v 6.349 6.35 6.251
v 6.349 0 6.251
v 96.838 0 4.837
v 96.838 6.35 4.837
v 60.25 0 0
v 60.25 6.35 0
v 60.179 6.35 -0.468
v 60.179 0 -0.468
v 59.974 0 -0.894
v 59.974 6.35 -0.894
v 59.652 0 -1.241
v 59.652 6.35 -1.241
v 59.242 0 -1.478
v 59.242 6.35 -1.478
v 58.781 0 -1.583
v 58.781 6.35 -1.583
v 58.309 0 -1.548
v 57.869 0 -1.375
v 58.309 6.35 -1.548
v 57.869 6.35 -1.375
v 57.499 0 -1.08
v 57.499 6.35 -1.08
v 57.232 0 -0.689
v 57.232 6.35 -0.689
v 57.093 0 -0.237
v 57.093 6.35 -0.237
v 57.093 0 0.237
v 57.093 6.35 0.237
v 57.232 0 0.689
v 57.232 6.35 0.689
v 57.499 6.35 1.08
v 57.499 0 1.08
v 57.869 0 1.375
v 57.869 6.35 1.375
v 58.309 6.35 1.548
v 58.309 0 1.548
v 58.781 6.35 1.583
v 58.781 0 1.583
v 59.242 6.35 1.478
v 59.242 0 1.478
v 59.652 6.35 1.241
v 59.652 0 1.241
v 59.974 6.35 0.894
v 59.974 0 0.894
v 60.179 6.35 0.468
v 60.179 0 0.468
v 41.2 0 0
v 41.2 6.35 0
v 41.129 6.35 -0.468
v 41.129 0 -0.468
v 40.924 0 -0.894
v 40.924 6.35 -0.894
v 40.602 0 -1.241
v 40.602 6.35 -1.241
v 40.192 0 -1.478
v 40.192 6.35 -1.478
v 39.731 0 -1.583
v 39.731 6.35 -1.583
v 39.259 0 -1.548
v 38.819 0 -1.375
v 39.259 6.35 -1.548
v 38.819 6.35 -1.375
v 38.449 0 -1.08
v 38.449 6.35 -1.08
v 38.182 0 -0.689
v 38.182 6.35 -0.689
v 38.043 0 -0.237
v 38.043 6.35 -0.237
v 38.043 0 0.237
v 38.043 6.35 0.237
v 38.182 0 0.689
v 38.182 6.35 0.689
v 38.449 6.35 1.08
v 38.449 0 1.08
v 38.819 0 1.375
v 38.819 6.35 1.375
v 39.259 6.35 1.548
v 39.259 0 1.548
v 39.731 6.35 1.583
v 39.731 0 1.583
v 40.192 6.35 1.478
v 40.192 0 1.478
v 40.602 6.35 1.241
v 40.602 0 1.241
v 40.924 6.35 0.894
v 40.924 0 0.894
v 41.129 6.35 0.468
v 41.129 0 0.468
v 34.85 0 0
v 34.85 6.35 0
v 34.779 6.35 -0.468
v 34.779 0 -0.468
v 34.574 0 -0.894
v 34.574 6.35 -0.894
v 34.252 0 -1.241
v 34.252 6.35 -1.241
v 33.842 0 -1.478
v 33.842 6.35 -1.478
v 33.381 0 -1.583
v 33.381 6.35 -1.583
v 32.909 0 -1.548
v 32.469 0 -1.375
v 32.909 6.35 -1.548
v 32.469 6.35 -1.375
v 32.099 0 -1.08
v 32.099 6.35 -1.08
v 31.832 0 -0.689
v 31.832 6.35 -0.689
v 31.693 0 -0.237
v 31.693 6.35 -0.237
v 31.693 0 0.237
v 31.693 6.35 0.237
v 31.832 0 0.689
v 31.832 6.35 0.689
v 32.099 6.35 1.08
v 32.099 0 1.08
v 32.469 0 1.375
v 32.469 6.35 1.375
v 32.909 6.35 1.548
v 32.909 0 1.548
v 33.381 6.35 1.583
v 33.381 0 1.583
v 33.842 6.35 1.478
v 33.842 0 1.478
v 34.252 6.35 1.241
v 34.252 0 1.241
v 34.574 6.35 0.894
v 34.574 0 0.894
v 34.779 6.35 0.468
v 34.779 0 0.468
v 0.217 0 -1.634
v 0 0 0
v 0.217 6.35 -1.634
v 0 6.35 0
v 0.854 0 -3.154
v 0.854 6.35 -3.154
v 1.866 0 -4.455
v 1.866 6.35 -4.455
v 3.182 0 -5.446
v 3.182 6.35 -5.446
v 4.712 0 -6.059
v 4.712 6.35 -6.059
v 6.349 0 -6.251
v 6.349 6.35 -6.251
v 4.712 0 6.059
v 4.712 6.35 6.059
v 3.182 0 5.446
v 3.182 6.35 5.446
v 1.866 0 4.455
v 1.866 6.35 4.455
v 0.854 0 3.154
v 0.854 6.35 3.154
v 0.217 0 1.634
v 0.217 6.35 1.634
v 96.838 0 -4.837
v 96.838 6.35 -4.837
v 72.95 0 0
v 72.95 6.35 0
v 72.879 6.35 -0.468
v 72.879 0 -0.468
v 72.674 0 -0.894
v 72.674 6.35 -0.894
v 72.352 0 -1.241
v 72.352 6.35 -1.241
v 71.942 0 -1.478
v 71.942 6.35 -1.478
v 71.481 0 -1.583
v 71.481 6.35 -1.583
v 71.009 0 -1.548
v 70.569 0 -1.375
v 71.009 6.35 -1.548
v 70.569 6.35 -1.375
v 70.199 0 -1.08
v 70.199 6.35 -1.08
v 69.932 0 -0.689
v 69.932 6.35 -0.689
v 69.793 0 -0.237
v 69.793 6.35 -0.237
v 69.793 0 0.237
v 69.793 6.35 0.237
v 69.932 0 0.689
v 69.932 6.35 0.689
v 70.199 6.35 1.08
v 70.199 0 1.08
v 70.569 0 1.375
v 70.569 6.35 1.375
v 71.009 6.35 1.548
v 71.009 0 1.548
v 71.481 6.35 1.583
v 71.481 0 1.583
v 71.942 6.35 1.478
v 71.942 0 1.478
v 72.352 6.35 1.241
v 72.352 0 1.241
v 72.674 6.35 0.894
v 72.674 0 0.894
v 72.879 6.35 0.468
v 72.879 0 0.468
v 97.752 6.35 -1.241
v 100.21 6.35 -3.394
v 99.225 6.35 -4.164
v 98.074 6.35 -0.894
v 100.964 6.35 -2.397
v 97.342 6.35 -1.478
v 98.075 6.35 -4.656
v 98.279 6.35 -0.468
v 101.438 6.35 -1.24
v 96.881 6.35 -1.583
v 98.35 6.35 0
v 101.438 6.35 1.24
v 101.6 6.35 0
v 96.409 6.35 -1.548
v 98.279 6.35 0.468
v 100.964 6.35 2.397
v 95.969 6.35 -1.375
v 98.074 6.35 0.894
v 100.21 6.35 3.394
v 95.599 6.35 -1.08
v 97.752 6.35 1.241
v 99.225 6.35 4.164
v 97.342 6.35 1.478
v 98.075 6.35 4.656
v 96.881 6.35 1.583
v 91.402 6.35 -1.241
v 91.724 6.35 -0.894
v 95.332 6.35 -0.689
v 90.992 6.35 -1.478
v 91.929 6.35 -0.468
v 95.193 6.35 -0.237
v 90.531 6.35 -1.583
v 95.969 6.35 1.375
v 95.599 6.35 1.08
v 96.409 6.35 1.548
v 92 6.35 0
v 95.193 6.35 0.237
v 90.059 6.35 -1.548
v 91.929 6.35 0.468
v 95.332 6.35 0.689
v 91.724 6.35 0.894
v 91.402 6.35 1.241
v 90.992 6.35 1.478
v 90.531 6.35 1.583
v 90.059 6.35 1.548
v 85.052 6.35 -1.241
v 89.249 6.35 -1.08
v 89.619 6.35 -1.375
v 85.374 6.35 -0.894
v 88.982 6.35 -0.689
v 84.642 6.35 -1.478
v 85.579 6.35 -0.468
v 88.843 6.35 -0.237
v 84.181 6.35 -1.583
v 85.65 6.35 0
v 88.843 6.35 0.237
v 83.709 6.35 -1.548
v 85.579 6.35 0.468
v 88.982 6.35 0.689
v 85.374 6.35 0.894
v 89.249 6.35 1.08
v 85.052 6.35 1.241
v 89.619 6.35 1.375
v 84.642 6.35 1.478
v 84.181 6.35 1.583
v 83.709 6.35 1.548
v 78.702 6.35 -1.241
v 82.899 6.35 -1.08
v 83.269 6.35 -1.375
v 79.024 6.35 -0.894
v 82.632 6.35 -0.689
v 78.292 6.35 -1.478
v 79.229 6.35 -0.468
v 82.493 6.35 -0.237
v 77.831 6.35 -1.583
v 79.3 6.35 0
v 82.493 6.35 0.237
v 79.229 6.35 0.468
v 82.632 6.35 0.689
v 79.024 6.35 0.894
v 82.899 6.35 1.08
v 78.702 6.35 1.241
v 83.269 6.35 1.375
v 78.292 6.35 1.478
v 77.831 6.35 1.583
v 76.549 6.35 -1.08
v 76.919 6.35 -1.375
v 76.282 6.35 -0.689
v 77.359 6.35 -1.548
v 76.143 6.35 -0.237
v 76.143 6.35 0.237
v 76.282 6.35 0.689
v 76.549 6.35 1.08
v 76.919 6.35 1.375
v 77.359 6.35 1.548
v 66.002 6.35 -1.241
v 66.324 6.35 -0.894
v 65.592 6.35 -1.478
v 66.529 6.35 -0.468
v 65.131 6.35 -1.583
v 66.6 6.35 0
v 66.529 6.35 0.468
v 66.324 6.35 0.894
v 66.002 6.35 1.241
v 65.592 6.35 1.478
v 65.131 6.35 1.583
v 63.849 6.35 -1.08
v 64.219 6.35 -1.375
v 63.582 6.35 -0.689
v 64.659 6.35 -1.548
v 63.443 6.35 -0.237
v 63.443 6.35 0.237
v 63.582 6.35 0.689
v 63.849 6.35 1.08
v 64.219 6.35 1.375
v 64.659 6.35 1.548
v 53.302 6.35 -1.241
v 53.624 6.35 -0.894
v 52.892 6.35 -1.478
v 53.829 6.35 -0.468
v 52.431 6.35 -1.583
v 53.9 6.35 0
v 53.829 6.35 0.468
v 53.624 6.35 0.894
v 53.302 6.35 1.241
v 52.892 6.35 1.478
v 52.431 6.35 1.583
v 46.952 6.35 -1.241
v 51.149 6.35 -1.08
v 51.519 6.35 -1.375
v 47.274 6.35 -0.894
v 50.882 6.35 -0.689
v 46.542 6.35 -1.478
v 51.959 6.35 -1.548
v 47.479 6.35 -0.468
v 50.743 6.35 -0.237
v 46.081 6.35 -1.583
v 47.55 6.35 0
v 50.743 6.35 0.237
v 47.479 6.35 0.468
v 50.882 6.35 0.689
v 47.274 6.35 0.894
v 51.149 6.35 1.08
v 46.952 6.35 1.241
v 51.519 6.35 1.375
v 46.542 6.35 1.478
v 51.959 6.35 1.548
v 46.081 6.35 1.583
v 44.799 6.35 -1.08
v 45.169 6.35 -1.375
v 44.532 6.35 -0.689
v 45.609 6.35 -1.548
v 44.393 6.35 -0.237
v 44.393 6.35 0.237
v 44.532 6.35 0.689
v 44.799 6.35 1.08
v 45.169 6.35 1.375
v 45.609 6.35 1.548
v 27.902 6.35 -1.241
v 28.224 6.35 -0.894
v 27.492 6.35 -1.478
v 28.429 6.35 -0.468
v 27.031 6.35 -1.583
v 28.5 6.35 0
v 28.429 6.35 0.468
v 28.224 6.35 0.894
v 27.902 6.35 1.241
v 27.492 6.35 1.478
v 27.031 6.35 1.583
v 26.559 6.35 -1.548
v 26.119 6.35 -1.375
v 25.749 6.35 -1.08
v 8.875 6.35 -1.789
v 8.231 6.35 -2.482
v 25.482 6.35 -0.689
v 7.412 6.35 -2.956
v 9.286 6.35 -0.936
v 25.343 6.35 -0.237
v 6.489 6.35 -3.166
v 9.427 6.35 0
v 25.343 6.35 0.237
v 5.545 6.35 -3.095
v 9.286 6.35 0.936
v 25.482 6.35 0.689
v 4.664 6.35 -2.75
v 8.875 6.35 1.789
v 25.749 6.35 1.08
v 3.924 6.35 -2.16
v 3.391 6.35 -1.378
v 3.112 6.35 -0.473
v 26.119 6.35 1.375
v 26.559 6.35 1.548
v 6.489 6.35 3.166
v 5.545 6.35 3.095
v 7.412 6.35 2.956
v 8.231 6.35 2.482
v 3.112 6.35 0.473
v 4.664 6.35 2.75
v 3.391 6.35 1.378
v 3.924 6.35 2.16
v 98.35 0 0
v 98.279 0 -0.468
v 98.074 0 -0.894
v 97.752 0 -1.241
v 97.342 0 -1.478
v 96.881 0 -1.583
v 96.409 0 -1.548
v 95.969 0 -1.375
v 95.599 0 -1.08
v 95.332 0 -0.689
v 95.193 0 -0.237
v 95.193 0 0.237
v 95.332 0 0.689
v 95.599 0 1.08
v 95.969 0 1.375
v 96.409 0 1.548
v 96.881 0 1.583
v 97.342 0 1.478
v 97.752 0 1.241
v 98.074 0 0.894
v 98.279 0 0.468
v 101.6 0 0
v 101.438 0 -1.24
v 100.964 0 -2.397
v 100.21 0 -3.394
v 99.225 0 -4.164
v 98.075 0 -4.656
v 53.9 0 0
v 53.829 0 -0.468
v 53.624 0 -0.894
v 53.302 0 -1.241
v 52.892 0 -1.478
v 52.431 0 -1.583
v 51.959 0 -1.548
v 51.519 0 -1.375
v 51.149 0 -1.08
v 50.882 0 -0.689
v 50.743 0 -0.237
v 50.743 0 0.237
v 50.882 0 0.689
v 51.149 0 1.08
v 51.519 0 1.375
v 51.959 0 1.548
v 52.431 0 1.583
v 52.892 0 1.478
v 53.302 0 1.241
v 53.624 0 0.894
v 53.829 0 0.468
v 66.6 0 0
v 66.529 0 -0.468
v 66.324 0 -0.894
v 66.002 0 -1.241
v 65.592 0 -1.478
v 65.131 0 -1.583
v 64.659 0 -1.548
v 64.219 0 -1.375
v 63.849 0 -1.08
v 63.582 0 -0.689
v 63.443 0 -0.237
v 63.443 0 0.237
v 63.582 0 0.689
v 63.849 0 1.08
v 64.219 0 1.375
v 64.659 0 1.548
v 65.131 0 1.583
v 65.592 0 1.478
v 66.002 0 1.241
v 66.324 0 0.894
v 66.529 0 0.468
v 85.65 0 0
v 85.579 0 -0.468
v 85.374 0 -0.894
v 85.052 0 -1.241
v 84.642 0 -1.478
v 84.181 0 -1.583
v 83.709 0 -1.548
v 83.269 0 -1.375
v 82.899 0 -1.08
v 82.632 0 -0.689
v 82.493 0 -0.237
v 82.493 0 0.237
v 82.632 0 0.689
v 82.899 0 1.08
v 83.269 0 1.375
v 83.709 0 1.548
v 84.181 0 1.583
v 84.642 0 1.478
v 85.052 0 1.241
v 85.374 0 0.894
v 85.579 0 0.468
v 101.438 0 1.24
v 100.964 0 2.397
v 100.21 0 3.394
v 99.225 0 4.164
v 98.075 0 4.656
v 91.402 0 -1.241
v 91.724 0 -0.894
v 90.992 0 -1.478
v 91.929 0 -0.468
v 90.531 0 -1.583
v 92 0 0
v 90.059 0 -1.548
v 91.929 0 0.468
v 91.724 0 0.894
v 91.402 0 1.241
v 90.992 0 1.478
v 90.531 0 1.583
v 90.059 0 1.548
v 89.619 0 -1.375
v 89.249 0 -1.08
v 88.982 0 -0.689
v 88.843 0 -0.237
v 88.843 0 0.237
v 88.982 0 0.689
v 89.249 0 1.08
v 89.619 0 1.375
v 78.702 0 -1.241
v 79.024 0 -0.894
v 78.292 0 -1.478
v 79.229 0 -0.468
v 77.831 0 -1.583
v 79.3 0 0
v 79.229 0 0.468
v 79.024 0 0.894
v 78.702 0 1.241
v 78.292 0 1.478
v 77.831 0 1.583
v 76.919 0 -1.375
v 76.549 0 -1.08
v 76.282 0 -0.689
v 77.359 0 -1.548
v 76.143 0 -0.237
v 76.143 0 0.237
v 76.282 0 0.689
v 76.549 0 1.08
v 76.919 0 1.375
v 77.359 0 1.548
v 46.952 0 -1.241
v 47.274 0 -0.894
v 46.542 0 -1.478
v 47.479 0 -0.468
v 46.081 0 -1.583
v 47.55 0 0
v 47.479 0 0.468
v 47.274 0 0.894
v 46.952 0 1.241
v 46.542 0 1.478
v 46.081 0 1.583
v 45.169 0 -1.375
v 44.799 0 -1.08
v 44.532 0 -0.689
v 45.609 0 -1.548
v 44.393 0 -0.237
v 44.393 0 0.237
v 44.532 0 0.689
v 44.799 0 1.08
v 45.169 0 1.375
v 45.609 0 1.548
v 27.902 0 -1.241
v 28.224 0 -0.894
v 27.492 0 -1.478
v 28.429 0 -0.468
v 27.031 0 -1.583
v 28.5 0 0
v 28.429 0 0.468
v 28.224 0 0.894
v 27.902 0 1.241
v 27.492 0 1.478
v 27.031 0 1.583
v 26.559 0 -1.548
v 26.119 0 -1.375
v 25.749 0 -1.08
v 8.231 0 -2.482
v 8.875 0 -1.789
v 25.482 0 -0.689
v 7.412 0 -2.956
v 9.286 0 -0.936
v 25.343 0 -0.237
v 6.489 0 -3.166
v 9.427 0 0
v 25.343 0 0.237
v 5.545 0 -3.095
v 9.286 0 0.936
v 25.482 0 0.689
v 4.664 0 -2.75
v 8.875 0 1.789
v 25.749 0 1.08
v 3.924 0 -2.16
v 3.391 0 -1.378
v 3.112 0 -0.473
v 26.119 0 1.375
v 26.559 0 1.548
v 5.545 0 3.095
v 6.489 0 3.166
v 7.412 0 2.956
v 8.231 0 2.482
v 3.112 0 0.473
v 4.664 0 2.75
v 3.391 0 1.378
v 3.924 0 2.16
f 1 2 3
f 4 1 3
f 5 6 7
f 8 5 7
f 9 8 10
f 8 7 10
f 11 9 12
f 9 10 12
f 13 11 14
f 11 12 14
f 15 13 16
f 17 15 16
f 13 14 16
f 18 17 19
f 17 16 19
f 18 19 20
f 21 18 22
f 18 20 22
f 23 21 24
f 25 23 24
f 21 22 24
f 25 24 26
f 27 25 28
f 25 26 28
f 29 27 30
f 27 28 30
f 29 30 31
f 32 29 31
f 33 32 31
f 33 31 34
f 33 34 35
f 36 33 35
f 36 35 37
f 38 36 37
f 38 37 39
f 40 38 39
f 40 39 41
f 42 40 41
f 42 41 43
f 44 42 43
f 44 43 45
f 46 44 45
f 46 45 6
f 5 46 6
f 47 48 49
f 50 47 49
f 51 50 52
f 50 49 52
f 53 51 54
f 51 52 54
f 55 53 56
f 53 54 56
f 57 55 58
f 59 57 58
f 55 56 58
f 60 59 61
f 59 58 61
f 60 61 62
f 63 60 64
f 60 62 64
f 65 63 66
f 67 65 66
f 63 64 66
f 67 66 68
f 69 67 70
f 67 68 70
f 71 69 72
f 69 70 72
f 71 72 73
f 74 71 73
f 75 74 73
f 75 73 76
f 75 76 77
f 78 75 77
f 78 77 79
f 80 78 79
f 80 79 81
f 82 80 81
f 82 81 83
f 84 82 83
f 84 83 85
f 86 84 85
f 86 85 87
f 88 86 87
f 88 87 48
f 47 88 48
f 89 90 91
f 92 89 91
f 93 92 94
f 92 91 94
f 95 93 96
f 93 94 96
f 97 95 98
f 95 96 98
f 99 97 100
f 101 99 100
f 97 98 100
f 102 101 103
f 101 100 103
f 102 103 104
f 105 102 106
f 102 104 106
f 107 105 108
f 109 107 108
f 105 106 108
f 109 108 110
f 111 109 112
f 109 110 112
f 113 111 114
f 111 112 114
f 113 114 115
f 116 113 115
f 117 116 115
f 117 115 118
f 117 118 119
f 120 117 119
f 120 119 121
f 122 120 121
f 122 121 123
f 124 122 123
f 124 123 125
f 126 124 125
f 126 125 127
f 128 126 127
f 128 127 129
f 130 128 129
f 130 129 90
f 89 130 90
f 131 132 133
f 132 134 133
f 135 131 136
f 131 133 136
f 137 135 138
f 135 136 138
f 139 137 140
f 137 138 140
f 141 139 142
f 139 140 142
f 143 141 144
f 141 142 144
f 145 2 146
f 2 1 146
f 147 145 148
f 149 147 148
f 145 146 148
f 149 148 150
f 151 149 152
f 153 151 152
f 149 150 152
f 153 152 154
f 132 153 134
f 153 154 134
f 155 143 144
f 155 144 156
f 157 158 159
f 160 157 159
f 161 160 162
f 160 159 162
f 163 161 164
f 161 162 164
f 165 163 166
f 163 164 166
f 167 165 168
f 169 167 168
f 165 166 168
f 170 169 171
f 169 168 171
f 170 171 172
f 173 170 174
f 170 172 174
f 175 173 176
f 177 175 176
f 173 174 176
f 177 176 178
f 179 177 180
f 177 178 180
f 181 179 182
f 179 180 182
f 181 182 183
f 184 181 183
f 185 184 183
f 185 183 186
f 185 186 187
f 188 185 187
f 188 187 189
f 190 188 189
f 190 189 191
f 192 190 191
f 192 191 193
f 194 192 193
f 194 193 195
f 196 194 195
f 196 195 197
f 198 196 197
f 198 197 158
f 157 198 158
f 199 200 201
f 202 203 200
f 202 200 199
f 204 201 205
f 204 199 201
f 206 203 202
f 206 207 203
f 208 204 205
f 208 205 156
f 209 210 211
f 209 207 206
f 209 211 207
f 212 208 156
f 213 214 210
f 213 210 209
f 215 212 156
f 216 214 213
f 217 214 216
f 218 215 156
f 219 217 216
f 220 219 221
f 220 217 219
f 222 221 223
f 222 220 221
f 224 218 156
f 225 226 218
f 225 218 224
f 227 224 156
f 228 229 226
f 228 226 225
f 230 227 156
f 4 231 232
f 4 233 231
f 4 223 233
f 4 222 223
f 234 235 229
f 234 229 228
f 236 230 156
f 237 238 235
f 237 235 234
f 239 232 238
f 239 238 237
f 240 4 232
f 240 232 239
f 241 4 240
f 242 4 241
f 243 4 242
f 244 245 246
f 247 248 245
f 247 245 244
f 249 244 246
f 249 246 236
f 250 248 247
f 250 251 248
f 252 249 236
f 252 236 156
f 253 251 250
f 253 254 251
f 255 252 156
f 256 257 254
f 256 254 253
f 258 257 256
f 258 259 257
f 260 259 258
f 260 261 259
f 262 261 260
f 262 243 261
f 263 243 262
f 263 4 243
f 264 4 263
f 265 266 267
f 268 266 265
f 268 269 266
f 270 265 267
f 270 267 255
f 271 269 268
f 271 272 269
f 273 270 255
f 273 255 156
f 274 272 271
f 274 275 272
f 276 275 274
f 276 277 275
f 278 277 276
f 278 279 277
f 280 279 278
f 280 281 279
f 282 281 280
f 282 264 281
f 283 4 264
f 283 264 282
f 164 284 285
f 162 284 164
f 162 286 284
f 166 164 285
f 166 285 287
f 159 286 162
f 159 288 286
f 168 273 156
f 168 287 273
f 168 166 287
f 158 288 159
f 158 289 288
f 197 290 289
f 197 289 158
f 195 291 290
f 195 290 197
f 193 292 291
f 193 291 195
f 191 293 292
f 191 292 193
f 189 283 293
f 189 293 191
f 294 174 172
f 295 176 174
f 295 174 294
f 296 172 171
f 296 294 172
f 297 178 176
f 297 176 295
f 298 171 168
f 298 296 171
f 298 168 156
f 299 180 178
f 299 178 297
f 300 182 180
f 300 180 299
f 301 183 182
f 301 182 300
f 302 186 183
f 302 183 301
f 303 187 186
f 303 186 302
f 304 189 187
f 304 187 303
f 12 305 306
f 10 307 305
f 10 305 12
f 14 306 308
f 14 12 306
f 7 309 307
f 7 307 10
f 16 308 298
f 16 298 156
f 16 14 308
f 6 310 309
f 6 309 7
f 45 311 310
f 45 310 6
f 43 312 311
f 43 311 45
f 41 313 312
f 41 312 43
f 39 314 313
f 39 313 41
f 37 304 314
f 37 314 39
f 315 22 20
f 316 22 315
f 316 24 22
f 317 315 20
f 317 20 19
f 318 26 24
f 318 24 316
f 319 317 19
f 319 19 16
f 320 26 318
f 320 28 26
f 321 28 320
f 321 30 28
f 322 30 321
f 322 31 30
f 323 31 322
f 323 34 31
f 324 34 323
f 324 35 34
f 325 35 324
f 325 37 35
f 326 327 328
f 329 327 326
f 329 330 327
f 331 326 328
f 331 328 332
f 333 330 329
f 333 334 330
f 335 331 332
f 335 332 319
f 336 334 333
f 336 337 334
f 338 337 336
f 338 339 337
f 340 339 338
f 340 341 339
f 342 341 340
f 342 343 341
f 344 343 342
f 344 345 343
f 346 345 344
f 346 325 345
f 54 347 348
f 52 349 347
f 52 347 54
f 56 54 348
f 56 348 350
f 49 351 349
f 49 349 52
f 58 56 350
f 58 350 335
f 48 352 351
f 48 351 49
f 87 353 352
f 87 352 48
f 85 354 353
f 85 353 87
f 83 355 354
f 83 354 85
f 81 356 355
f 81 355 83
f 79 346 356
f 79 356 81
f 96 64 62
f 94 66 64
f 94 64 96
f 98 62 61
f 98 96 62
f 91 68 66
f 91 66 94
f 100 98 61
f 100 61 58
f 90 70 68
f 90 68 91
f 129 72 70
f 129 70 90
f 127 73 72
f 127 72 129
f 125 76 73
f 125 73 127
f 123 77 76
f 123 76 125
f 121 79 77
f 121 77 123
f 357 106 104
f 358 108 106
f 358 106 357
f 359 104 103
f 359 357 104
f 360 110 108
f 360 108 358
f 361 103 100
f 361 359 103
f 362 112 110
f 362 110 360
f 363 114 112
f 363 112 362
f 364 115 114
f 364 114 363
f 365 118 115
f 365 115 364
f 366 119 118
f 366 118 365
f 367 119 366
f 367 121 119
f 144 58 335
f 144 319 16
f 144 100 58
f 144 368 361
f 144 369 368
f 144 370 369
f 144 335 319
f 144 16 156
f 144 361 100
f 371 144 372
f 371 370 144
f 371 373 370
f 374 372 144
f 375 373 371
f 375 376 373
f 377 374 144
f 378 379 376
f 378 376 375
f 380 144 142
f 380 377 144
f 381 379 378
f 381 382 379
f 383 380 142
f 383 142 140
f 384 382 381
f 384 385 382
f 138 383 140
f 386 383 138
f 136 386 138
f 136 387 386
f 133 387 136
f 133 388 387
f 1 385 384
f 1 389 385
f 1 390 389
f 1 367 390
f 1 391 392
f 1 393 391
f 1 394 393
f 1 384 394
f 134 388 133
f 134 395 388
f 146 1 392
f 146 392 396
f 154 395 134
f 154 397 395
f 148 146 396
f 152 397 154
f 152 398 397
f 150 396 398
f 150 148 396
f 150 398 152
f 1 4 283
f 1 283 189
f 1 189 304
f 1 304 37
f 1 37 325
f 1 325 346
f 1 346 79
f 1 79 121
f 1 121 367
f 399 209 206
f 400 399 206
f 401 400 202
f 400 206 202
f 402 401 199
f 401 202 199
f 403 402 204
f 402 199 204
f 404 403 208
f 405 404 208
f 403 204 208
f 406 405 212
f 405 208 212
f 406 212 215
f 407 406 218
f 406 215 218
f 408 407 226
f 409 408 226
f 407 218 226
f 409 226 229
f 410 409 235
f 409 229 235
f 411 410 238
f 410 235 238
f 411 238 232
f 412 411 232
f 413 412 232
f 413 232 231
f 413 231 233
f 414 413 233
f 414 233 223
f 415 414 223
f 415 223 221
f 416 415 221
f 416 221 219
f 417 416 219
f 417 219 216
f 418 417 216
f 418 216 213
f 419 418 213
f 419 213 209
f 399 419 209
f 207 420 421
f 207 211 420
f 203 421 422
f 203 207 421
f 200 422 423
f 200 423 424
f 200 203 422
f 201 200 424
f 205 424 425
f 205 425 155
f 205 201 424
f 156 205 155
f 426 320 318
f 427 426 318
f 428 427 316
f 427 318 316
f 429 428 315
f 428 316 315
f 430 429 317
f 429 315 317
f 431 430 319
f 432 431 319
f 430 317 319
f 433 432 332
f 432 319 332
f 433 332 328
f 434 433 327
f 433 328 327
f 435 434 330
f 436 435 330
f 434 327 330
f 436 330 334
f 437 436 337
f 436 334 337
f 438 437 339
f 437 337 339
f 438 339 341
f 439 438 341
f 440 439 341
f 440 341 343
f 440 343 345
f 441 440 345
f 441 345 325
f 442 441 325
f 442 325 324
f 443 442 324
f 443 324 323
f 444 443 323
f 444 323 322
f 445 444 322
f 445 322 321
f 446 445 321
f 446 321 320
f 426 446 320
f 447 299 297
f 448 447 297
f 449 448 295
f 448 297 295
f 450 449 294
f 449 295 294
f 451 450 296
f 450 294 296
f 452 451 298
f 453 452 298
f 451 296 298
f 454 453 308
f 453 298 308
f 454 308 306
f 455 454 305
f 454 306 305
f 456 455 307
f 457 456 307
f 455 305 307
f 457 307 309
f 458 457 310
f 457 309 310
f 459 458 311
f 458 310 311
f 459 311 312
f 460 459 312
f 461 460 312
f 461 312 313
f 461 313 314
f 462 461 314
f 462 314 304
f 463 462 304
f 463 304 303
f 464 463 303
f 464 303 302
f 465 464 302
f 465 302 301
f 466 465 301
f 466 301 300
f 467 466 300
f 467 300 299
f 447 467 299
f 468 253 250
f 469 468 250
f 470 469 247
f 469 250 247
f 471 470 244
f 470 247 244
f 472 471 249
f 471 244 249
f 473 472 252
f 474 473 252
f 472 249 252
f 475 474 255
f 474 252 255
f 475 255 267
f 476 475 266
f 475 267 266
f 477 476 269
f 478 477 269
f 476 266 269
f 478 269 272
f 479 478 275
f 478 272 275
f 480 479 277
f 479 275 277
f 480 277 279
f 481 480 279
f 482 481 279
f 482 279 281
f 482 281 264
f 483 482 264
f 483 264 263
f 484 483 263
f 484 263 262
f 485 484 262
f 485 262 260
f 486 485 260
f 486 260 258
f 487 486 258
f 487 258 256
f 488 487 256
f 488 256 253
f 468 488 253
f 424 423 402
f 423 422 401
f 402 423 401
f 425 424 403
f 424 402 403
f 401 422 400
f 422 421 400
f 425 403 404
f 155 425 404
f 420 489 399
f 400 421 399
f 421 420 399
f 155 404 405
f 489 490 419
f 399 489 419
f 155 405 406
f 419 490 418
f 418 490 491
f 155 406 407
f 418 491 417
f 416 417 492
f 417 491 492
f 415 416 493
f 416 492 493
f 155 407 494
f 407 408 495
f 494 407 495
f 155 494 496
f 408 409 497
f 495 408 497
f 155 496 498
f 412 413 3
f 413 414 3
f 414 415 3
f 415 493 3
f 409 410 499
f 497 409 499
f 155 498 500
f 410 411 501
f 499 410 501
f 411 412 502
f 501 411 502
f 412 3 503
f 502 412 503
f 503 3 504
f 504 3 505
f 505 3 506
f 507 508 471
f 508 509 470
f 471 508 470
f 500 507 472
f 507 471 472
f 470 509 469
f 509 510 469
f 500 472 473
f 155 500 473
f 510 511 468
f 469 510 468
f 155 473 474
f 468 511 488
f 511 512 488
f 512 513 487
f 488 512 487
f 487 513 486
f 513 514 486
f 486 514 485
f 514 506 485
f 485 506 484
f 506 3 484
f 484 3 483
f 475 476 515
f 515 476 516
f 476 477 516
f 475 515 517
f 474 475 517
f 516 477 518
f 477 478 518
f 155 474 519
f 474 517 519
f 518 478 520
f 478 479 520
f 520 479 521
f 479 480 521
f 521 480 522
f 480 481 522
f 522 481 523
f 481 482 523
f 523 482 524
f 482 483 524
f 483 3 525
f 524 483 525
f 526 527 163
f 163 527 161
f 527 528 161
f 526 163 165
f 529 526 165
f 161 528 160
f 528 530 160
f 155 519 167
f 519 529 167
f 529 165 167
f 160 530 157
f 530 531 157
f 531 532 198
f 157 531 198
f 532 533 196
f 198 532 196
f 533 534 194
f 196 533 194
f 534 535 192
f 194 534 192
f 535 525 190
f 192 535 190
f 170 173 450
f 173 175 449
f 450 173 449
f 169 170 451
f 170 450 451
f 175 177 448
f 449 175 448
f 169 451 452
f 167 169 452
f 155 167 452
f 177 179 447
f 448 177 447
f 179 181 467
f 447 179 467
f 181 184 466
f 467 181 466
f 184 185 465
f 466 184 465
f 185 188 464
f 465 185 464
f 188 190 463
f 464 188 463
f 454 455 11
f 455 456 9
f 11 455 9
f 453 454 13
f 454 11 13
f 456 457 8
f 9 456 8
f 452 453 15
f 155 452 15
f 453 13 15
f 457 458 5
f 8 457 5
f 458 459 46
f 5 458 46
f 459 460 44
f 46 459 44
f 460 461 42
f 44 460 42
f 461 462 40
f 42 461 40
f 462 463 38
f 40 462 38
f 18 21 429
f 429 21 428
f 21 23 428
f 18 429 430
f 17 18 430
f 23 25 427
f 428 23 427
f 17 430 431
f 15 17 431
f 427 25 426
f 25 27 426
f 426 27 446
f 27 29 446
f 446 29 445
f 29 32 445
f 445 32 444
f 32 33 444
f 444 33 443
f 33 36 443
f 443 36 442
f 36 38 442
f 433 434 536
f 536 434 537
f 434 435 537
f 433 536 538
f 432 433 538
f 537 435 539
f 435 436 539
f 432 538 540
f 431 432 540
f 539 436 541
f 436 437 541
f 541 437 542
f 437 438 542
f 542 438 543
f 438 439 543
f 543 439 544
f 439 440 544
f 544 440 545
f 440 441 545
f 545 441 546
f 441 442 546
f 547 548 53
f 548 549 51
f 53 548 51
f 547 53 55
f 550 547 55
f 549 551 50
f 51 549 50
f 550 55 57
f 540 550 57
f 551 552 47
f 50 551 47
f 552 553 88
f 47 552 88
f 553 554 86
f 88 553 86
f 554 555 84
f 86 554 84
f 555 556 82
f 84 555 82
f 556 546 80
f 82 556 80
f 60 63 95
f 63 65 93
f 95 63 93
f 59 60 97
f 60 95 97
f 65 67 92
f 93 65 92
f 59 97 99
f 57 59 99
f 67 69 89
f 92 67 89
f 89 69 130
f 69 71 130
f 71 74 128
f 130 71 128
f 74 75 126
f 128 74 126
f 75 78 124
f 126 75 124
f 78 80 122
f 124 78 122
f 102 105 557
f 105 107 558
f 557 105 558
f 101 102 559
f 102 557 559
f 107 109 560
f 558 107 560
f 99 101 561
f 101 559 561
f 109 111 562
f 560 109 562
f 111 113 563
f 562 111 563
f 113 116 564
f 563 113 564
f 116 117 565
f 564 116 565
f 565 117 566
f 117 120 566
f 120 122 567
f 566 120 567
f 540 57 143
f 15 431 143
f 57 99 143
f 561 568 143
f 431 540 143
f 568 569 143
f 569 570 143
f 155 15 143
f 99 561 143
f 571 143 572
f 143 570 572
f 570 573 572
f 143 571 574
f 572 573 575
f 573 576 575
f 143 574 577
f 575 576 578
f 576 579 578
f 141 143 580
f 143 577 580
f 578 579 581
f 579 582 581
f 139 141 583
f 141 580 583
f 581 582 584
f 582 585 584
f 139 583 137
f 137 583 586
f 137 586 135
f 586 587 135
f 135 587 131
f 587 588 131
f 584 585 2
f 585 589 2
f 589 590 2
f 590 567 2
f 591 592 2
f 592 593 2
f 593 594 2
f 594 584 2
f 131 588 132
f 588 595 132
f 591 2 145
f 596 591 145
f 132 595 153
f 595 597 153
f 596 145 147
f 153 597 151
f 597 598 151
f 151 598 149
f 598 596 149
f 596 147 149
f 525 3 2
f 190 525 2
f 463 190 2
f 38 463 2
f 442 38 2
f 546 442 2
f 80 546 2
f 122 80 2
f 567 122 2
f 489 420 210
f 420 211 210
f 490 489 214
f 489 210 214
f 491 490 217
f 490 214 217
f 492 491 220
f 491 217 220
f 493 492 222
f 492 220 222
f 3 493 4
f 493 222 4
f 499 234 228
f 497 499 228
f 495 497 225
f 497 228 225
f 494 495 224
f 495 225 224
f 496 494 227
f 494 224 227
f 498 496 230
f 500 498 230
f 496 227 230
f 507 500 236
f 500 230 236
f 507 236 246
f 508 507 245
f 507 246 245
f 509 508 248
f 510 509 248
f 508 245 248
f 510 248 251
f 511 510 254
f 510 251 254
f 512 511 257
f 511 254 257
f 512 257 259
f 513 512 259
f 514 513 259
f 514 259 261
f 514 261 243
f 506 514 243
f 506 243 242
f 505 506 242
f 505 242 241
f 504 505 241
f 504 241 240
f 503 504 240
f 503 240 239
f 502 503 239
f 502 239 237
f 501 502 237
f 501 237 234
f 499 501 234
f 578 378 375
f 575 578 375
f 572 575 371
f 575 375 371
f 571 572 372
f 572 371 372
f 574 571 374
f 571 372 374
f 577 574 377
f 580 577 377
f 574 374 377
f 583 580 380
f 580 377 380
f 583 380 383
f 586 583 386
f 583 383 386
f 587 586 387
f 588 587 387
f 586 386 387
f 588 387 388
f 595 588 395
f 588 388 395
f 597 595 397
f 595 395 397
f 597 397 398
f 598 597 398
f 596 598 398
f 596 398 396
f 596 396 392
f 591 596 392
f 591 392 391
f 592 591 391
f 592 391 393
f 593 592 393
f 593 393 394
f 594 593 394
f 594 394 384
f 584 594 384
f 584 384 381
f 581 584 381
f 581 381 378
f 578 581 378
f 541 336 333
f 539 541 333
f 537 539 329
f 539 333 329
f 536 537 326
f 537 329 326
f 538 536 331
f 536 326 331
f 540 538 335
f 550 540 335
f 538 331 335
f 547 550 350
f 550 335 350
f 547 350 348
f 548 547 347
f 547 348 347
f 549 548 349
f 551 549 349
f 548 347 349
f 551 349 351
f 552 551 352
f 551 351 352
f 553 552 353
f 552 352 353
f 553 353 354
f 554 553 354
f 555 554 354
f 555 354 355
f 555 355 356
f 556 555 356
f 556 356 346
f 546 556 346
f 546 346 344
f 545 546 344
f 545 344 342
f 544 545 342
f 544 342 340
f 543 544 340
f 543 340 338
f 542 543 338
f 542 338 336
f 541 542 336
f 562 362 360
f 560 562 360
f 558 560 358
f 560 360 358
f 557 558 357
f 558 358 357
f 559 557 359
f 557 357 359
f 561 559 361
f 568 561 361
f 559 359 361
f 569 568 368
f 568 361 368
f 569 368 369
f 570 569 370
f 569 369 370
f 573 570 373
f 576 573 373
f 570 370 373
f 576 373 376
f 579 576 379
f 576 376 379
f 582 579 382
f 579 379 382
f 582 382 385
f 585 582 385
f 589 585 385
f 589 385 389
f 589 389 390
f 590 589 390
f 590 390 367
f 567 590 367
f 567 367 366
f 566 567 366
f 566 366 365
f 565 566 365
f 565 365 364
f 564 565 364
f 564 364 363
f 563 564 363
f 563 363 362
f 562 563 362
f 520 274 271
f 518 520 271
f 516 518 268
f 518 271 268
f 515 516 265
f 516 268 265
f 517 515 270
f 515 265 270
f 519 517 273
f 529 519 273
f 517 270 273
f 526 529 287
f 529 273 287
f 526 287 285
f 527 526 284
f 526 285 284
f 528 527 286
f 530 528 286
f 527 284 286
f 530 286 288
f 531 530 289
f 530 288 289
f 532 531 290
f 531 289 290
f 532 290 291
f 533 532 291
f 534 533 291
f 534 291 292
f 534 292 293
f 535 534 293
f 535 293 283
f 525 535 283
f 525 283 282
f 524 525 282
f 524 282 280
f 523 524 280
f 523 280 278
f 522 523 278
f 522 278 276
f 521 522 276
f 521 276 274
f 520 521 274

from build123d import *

# Parameters (mm, degrees)
BOSS_EXTRUDE1_DEPTH = 6.35
FILLET1_R           = 4.837495
FILLET3_R           = 6.251556
SKETCH3_R           = 3.175
SKETCH3_R_2         = 1.5875
CUT_EXTRUDE1_DEPTH  = 7.35
SKETCH5_R           = 1.5875
CUT_EXTRUDE2_DEPTH  = 7.35
LPATTERN1_COUNT     = 11
LPATTERN1_PITCH     = 6.35


with BuildPart() as part:
    # Sketch2 → Boss-Extrude1 (new body)
    with BuildSketch(Plane(origin=(0, 0, 0), x_dir=(1, 0, 0), z_dir=(0, 1, 0))):
        Polygon((0, 0), (0, 6.35), (101.6, 4.7625), (101.6, 0), align=None)
    boss_extrude1 = extrude(amount=BOSS_EXTRUDE1_DEPTH)

    # Mirror1: Boss-Extrude1 across plane
    add(boss_extrude1.mirror(Plane(origin=(101.6, 6.35, 0), x_dir=(1, 0, 0), z_dir=(0, 0, -1))))

    # Fillet1
    fillet1_edges = [part.edges().sort_by_distance(p)[0] for p in [
        (101.6, 3.175, 4.7625),
        (101.6, 3.175, -4.7625),
    ]]
    fillet(fillet1_edges, radius=FILLET1_R)

    # Fillet3
    fillet3_edges = [part.edges().sort_by_distance(p)[0] for p in [
        (0, 3.175, 6.35),
        (0, 3.175, -6.35),
    ]]
    fillet(fillet3_edges, radius=FILLET3_R)

    # Sketch3 → Cut-Extrude1 (cut, through all)
    with BuildSketch(Plane(origin=(0, 6.35, 0), x_dir=(1, 0, 0), z_dir=(0, 1, 0))):
        with Locations((6.251556349, 0)):
            Circle(SKETCH3_R)
        with Locations((96.762504613, 0)):
            Circle(SKETCH3_R_2)
    extrude(amount=-CUT_EXTRUDE1_DEPTH, mode=Mode.SUBTRACT)

    # Sketch5 → Cut-Extrude2 (cut, through all)
    with BuildSketch(Plane(origin=(0, 6.35, 0), x_dir=(1, 0, 0), z_dir=(0, 1, 0))):
        with Locations((90.412504613, 0)):
            Circle(SKETCH5_R)
    cut_extrude2 = extrude(amount=-CUT_EXTRUDE2_DEPTH, mode=Mode.SUBTRACT)

    # LPattern1: Cut-Extrude2 ×11
    with Locations(*[(-i * LPATTERN1_PITCH, 0, 0) for i in range(1, LPATTERN1_COUNT)]):
        add(cut_extrude2, mode=Mode.SUBTRACT)


solid = part.part
